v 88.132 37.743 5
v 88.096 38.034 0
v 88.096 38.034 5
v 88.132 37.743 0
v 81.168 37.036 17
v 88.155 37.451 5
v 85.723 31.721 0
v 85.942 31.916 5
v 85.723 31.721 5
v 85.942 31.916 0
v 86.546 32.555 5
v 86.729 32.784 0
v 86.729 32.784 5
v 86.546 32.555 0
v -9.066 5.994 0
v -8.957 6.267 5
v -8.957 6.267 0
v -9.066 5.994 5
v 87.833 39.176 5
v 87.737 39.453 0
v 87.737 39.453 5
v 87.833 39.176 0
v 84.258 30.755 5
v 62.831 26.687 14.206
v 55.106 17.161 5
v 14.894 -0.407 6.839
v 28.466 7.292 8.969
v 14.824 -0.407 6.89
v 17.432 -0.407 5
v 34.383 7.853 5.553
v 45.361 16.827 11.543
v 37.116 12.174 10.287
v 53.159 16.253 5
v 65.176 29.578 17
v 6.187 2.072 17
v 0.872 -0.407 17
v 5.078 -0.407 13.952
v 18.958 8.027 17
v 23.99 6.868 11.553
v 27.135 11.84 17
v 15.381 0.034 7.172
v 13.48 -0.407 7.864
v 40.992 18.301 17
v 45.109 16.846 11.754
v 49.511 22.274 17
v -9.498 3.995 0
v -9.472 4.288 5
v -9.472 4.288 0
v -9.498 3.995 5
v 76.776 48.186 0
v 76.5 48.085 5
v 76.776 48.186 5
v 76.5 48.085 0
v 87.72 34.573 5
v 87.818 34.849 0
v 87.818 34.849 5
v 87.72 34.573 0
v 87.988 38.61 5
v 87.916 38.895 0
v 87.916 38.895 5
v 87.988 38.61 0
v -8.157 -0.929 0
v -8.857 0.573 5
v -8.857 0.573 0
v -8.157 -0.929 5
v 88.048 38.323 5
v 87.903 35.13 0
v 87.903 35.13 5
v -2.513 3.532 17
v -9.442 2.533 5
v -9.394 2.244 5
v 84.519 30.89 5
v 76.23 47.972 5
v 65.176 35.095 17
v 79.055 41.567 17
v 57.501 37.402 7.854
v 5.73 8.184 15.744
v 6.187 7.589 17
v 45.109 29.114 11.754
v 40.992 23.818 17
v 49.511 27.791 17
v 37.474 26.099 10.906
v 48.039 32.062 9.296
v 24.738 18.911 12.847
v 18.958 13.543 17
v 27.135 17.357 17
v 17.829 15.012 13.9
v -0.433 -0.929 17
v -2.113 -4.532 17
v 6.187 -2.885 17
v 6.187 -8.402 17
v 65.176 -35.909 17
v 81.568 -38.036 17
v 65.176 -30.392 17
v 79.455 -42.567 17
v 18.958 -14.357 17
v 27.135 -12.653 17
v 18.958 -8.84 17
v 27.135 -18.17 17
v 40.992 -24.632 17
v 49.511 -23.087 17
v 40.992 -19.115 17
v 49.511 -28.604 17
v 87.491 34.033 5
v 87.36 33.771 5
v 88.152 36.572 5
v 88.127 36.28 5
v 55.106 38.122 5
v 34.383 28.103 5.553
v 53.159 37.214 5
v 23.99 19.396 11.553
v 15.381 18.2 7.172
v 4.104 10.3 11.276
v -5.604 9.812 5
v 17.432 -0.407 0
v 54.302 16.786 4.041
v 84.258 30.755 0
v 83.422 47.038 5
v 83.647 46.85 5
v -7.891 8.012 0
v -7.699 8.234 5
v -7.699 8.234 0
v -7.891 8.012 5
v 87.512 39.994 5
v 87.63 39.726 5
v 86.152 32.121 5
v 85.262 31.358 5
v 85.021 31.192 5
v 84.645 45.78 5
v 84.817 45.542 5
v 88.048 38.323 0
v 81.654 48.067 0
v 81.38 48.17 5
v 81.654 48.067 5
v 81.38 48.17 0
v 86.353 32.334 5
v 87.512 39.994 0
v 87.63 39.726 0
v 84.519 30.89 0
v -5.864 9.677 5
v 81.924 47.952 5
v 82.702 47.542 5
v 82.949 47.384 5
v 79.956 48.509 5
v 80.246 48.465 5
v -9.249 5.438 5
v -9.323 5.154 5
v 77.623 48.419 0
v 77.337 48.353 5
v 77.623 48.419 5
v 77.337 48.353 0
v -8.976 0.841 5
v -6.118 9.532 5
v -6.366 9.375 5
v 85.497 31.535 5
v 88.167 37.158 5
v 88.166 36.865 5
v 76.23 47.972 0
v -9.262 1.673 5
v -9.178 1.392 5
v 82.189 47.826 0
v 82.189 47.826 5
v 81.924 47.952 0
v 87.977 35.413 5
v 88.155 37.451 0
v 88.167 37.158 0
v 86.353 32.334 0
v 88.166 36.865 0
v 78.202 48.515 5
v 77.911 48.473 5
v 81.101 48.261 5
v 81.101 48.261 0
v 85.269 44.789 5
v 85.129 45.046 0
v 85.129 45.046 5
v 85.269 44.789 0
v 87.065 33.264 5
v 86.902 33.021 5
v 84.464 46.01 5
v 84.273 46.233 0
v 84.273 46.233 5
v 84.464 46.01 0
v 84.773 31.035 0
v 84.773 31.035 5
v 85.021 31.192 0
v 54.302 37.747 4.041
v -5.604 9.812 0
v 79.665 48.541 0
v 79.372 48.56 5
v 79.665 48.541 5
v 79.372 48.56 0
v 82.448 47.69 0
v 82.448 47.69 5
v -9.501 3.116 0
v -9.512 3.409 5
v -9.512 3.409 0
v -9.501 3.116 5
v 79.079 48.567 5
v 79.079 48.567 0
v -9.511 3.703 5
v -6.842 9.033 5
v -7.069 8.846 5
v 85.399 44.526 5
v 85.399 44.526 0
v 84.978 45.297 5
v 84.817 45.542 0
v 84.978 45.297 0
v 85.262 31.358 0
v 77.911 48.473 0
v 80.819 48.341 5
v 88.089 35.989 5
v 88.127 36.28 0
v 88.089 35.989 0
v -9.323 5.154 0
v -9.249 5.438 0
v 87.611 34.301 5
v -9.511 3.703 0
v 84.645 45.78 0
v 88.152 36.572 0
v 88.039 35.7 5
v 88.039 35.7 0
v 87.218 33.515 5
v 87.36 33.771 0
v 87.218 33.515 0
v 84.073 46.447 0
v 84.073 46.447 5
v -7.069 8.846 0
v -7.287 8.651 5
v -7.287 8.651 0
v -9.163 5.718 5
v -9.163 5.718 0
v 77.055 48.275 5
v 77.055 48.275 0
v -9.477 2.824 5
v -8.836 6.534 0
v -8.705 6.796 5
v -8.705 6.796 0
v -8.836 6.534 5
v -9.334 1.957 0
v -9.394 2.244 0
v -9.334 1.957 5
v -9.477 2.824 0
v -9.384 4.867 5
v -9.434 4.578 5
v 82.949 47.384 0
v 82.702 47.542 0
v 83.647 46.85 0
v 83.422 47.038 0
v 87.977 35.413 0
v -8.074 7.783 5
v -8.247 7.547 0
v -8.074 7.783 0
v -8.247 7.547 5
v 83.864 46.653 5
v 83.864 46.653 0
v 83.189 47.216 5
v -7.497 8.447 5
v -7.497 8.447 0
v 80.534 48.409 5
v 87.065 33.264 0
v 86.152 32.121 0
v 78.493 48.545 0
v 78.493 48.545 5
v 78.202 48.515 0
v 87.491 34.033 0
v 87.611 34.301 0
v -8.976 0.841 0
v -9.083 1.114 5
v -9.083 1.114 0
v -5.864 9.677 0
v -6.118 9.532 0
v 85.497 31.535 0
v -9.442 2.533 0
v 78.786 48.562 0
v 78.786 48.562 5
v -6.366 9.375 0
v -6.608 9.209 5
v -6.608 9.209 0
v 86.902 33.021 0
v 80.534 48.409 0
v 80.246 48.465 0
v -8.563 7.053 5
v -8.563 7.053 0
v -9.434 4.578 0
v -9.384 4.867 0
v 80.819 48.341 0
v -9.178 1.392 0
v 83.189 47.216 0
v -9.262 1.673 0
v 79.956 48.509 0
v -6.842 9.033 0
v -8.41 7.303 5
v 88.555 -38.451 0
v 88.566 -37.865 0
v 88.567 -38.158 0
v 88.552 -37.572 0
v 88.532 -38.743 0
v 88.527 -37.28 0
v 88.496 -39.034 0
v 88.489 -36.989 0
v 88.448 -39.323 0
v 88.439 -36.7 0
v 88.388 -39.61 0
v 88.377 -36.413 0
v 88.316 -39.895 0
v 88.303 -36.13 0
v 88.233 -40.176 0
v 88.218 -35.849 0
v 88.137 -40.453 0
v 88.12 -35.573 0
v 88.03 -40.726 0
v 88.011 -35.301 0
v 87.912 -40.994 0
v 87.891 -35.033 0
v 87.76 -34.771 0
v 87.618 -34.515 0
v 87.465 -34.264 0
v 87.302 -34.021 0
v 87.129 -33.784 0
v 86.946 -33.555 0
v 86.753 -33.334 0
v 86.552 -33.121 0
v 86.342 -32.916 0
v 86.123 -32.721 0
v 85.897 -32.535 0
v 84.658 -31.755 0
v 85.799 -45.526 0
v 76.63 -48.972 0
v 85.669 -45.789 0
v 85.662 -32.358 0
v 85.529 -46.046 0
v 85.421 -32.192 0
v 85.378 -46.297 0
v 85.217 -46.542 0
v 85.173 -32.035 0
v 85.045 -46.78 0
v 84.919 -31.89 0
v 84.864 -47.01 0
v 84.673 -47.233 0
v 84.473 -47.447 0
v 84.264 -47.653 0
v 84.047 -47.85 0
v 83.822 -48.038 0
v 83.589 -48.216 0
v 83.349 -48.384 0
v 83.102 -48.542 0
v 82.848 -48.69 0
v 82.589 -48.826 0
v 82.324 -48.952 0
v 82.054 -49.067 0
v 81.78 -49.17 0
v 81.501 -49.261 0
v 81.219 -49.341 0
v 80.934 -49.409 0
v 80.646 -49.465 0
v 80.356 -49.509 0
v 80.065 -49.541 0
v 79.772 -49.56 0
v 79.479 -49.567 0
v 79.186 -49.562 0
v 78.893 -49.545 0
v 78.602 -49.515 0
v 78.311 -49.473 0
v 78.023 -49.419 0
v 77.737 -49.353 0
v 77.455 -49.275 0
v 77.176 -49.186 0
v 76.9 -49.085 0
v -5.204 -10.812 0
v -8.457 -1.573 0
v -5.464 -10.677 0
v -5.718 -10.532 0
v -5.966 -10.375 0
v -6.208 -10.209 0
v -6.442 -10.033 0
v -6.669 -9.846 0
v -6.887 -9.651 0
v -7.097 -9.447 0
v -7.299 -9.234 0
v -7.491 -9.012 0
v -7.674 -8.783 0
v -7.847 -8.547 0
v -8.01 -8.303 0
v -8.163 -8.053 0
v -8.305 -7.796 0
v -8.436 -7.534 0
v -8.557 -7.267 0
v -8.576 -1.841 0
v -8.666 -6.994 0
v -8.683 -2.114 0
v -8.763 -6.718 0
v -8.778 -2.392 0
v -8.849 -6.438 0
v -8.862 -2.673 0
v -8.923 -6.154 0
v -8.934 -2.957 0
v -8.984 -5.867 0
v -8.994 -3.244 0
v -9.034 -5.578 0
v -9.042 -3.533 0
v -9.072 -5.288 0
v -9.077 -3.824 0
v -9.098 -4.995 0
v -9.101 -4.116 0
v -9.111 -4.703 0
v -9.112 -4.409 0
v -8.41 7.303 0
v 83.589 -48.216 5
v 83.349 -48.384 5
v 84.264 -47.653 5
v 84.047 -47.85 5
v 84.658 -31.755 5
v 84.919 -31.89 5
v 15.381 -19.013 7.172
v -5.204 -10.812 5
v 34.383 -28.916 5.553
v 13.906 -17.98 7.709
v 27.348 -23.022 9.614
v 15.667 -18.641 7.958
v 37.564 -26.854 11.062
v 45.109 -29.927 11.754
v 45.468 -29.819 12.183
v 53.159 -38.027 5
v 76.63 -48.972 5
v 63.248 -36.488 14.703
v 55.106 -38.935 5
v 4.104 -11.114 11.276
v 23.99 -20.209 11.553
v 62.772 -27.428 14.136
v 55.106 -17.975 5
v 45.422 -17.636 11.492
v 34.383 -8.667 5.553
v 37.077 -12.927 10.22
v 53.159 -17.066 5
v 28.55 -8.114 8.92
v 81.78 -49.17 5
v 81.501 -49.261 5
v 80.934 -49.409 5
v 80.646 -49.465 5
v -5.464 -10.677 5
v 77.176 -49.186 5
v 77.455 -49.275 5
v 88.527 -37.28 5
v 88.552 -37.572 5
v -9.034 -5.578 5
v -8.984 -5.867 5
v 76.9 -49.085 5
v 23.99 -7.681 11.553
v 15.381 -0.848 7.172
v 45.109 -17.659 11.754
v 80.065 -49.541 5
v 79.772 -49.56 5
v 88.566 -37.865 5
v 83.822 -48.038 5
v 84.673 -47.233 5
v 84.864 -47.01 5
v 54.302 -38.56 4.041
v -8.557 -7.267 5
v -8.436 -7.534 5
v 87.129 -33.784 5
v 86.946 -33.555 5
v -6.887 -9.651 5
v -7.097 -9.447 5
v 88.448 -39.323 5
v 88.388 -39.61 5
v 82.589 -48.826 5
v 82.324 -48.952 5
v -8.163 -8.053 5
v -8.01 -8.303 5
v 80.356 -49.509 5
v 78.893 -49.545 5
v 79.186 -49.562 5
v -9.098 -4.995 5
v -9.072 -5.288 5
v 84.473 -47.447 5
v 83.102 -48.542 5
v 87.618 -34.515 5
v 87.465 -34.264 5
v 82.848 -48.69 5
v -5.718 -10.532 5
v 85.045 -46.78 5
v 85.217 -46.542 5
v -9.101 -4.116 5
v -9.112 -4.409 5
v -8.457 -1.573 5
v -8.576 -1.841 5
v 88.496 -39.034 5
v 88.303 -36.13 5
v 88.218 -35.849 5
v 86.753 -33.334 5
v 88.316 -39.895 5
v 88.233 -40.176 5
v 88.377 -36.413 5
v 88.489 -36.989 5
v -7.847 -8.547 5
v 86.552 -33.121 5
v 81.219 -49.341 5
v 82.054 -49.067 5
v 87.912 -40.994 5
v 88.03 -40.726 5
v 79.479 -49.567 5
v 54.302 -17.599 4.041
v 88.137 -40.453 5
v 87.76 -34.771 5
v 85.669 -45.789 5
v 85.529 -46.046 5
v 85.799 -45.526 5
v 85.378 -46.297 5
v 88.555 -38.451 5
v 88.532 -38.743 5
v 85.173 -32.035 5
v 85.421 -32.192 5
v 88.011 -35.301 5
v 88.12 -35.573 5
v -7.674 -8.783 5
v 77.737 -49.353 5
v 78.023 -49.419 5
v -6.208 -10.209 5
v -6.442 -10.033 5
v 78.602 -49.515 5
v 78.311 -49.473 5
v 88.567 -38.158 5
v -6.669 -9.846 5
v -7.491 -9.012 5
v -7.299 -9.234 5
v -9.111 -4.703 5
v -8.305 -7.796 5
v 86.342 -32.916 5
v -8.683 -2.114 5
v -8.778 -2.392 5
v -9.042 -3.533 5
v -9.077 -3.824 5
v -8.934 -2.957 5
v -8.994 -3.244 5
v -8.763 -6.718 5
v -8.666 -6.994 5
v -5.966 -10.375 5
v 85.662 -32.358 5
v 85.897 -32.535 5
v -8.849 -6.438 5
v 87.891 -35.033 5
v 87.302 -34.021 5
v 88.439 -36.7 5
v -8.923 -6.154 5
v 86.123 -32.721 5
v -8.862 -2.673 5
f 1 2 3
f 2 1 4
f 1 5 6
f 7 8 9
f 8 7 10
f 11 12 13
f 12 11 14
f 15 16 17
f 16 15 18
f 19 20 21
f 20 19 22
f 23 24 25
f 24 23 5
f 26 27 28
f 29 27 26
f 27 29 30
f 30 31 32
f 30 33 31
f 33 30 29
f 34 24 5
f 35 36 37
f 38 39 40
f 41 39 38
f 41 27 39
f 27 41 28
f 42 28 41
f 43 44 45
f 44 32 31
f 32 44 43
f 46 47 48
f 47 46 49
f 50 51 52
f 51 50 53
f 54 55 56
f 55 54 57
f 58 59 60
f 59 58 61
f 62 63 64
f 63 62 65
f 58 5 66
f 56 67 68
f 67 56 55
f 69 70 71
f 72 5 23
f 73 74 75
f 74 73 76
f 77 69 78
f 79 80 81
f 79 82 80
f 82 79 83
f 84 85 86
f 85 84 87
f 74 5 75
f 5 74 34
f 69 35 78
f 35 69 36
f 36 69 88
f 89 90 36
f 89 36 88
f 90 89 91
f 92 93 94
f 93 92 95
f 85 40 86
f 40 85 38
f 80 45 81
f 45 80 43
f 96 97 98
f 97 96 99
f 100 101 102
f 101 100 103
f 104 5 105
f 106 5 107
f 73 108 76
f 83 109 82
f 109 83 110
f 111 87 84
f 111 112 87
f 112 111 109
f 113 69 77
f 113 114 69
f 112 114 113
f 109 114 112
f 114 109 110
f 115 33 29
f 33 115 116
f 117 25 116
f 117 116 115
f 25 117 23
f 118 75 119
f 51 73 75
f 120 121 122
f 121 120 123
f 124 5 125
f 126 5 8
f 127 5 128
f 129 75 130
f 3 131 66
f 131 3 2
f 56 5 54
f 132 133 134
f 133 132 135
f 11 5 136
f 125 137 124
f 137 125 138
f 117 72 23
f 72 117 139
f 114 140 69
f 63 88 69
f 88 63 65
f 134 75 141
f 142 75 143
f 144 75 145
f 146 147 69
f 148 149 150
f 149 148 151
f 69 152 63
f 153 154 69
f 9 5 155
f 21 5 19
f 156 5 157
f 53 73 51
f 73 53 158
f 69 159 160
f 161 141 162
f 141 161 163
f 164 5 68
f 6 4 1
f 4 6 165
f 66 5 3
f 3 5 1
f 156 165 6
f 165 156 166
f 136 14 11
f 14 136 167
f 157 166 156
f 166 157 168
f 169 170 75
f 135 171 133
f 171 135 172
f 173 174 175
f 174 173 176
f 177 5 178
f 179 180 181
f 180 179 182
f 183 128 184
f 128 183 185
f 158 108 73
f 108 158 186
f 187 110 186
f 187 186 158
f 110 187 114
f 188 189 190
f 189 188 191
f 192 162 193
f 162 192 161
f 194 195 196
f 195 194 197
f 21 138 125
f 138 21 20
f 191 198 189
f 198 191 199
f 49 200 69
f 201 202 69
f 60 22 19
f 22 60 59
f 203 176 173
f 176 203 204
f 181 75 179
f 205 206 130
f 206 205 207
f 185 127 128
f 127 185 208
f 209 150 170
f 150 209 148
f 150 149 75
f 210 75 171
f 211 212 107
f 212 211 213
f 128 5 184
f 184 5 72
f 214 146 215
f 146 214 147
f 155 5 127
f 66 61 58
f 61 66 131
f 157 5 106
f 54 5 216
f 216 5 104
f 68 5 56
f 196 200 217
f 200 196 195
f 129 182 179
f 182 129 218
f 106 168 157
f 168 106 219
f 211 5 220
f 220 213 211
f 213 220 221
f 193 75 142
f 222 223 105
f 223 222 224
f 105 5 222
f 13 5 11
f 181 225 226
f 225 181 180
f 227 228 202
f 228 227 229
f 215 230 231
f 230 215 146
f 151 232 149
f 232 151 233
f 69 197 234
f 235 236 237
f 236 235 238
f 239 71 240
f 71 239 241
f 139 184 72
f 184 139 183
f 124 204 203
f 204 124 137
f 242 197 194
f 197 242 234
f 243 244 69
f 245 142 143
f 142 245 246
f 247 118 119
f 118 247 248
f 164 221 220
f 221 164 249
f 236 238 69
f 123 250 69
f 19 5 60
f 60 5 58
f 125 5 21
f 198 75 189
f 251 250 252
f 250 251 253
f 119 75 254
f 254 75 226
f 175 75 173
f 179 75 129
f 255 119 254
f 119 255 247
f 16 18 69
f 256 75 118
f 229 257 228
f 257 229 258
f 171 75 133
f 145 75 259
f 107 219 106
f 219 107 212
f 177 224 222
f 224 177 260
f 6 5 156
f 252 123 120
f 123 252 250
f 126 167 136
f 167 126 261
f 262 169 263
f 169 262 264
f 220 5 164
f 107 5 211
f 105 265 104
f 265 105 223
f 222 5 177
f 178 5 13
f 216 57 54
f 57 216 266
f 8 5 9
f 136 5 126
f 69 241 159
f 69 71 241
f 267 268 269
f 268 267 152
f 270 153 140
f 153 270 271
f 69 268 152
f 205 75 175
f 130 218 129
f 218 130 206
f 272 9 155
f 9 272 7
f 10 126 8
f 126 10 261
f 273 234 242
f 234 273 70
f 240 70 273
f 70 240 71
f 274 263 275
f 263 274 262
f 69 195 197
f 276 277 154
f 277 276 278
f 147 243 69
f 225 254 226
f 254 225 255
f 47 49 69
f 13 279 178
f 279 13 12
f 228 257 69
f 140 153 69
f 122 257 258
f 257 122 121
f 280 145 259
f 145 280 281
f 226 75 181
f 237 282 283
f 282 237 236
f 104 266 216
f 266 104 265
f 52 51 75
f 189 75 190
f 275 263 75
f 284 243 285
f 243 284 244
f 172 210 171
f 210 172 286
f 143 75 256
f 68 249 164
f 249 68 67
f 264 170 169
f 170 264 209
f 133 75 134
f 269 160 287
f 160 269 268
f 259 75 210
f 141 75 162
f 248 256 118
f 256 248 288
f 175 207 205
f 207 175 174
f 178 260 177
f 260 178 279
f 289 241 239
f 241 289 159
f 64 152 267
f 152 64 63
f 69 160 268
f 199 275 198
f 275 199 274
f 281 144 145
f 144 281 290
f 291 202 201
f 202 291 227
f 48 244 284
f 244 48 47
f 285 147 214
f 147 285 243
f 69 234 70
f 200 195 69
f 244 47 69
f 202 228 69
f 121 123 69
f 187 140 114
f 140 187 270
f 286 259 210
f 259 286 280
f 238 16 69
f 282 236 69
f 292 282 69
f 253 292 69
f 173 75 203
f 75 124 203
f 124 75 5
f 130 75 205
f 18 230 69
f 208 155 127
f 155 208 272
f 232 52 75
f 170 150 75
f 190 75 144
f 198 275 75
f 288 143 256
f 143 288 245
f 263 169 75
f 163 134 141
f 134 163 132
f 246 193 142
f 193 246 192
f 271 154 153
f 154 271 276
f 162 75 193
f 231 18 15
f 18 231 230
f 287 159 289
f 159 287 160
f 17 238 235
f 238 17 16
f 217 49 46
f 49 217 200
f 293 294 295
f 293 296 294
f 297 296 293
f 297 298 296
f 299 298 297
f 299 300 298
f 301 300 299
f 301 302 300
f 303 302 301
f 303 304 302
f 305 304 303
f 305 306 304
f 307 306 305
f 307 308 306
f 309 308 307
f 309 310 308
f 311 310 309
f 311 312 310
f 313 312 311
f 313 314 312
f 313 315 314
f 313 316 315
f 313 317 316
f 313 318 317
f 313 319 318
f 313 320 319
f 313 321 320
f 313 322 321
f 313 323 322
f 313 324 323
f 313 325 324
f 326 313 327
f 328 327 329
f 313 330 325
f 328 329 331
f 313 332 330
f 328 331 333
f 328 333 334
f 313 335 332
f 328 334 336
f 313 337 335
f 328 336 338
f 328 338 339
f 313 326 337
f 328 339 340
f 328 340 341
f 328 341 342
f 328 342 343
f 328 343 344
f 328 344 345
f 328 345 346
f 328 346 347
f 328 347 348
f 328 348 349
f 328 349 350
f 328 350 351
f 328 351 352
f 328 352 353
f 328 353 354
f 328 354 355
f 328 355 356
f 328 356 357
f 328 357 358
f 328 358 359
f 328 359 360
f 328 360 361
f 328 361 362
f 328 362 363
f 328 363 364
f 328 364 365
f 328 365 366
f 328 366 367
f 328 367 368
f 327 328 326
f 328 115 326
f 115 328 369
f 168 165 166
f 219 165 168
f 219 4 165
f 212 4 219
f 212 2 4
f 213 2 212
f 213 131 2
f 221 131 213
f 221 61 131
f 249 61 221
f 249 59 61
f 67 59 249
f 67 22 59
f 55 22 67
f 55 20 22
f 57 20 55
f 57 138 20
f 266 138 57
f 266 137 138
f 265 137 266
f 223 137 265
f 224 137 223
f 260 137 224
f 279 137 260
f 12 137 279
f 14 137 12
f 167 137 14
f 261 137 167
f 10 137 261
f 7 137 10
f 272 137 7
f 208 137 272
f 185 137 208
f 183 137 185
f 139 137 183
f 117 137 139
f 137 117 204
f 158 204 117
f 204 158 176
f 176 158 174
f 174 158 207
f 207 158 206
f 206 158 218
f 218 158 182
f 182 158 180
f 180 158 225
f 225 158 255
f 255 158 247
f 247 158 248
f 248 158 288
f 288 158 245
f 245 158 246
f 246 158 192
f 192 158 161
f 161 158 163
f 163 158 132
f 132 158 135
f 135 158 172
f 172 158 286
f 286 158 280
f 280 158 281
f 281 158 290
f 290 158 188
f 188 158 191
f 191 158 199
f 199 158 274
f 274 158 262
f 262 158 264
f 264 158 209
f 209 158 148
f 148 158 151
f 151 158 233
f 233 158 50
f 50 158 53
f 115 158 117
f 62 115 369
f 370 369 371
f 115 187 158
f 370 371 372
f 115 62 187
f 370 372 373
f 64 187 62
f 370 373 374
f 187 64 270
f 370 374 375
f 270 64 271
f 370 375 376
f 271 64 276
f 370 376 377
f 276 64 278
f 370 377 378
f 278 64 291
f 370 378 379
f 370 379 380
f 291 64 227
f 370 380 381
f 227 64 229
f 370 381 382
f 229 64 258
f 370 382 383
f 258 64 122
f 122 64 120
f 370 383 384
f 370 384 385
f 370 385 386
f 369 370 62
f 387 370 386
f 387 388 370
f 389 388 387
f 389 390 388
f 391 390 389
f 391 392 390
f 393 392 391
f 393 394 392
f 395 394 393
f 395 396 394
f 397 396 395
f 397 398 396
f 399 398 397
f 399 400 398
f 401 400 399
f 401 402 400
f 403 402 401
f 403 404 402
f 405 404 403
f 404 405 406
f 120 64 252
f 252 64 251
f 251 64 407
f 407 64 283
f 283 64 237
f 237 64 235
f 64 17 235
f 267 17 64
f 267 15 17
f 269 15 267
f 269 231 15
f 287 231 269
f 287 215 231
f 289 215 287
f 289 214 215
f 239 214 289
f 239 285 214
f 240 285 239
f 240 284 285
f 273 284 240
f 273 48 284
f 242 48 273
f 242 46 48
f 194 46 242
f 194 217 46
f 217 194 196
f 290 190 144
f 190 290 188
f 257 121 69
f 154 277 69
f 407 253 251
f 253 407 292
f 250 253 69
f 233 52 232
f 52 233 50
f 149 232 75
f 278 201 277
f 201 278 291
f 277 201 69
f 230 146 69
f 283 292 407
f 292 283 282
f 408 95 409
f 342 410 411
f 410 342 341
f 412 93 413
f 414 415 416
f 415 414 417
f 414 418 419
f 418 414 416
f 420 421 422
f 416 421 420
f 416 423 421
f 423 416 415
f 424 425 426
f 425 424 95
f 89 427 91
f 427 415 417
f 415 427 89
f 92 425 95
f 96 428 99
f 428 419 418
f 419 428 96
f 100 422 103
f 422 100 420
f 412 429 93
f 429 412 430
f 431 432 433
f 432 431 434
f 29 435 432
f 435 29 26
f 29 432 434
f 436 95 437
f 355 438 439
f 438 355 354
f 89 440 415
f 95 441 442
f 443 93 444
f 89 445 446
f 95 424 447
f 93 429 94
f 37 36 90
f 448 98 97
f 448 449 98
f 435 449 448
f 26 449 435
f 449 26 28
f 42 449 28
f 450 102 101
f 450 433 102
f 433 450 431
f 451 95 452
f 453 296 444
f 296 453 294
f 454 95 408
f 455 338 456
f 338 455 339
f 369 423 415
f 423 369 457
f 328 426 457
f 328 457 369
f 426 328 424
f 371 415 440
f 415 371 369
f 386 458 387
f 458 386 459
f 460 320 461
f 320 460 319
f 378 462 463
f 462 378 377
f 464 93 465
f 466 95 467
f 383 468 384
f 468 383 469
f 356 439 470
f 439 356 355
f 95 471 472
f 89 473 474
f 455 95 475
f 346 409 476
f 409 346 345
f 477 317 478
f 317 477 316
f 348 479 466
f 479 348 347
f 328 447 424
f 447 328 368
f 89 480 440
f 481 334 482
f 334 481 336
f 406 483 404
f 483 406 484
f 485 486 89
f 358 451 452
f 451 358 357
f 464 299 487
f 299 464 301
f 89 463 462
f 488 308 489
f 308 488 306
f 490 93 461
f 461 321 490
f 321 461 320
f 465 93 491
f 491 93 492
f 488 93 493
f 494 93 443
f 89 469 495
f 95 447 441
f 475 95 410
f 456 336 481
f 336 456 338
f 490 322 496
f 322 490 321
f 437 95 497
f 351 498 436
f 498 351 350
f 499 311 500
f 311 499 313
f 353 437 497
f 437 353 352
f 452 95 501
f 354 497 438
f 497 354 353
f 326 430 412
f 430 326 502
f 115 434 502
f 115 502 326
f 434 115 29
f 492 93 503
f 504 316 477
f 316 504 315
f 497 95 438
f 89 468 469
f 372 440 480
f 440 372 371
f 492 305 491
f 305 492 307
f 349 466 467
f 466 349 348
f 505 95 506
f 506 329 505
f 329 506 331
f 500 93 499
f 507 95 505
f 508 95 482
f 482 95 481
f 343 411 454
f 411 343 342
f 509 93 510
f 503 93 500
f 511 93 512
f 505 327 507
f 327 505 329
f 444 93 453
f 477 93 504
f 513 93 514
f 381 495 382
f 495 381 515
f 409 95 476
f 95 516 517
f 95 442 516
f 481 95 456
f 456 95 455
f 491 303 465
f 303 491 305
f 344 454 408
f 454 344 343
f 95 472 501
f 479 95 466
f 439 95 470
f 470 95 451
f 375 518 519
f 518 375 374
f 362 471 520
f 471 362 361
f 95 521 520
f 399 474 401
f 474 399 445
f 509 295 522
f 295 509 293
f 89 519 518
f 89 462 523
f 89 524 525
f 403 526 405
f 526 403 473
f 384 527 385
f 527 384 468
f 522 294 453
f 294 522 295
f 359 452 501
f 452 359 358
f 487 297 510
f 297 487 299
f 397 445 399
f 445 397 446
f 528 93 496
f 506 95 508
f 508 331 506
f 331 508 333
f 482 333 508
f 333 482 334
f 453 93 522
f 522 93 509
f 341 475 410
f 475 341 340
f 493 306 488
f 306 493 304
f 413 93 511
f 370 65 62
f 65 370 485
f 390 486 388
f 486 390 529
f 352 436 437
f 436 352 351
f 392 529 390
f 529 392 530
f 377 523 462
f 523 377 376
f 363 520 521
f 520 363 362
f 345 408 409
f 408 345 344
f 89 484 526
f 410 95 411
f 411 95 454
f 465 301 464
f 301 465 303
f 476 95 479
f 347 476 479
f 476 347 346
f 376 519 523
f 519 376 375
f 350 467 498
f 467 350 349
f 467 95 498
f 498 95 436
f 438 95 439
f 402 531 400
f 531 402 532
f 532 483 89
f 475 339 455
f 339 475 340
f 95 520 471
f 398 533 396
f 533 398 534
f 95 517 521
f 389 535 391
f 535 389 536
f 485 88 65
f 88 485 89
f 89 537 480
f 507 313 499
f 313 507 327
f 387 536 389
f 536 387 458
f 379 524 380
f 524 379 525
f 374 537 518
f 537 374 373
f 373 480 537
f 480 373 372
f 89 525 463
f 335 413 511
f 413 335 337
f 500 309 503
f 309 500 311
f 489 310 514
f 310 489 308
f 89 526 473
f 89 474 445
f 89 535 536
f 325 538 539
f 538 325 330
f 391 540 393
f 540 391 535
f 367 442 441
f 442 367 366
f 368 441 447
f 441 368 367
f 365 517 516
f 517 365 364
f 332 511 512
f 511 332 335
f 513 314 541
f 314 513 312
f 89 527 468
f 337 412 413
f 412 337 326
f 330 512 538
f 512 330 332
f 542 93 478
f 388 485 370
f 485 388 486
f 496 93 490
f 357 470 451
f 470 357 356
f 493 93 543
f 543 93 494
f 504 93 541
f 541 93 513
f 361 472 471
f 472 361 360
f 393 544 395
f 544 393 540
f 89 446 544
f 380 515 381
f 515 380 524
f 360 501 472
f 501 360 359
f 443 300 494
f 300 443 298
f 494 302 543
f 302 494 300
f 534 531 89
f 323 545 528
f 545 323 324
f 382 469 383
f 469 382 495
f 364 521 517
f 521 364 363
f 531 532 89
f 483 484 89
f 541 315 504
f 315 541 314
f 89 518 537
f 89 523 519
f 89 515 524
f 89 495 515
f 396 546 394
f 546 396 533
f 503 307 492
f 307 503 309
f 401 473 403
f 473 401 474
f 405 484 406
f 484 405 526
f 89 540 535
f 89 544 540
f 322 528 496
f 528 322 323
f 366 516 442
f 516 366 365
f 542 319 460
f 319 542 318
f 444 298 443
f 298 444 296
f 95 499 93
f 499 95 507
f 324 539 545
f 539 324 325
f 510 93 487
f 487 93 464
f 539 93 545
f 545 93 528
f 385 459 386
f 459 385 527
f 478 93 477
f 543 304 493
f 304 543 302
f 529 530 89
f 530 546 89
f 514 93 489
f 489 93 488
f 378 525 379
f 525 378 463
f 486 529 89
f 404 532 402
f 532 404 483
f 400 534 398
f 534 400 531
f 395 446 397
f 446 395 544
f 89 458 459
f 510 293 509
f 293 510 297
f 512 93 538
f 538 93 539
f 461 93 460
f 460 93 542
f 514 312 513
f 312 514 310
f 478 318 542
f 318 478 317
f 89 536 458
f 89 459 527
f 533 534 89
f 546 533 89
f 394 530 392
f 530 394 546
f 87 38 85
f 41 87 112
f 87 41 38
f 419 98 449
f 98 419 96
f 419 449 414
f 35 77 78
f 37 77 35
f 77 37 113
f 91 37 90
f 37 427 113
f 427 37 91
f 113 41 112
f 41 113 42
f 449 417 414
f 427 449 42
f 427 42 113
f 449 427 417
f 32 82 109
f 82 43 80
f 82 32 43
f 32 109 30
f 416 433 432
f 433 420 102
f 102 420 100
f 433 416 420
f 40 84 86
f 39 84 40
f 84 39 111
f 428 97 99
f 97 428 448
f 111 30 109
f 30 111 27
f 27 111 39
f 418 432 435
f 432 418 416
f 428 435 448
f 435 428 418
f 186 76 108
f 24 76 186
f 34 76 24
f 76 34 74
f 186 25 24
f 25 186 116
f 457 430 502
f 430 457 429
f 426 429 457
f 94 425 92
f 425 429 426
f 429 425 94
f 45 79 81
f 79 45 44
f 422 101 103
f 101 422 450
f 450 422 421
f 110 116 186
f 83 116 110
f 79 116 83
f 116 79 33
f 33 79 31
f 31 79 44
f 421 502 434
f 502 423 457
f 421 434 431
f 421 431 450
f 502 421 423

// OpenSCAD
$fn = 150;
size = 5;

difference() {
    
    translate([0, 0, 0]) {
        translate([-0.4, -1, 0]) {
            rotate([0, 0, 25]) {
                arm();
            }
        }
        rotate([0, 0, -25]) {
            translate([0,-5, 0]) {
                arm();
            }
        }
    }
    
    translate([0, 0, 0])  {
        
        // phone 1
        rotate([110, 0, 90]) {
            translate([-78, 12,  0]) {
                phone();
            }
        }
        
        // phone 2
        rotate([120, 0, 90]) {
            translate([-78, 22, 15]) {
                phone();
            }
        }
        
        // phone 3
        rotate([130, 0, 90]) {
            translate([-78, 38, 27]) {
                phone();
            }
        }
        
        // surface
        translate([0, 0, -5]) {
            cube([200, 200, 10], true);
        }
    }
}

module arm() {
    minkowski() {
        cube([90, size, size]);
        cylinder(12, 7, 0);
    }
}

module phone() {
    #cube([155, 79, 12]);
}
